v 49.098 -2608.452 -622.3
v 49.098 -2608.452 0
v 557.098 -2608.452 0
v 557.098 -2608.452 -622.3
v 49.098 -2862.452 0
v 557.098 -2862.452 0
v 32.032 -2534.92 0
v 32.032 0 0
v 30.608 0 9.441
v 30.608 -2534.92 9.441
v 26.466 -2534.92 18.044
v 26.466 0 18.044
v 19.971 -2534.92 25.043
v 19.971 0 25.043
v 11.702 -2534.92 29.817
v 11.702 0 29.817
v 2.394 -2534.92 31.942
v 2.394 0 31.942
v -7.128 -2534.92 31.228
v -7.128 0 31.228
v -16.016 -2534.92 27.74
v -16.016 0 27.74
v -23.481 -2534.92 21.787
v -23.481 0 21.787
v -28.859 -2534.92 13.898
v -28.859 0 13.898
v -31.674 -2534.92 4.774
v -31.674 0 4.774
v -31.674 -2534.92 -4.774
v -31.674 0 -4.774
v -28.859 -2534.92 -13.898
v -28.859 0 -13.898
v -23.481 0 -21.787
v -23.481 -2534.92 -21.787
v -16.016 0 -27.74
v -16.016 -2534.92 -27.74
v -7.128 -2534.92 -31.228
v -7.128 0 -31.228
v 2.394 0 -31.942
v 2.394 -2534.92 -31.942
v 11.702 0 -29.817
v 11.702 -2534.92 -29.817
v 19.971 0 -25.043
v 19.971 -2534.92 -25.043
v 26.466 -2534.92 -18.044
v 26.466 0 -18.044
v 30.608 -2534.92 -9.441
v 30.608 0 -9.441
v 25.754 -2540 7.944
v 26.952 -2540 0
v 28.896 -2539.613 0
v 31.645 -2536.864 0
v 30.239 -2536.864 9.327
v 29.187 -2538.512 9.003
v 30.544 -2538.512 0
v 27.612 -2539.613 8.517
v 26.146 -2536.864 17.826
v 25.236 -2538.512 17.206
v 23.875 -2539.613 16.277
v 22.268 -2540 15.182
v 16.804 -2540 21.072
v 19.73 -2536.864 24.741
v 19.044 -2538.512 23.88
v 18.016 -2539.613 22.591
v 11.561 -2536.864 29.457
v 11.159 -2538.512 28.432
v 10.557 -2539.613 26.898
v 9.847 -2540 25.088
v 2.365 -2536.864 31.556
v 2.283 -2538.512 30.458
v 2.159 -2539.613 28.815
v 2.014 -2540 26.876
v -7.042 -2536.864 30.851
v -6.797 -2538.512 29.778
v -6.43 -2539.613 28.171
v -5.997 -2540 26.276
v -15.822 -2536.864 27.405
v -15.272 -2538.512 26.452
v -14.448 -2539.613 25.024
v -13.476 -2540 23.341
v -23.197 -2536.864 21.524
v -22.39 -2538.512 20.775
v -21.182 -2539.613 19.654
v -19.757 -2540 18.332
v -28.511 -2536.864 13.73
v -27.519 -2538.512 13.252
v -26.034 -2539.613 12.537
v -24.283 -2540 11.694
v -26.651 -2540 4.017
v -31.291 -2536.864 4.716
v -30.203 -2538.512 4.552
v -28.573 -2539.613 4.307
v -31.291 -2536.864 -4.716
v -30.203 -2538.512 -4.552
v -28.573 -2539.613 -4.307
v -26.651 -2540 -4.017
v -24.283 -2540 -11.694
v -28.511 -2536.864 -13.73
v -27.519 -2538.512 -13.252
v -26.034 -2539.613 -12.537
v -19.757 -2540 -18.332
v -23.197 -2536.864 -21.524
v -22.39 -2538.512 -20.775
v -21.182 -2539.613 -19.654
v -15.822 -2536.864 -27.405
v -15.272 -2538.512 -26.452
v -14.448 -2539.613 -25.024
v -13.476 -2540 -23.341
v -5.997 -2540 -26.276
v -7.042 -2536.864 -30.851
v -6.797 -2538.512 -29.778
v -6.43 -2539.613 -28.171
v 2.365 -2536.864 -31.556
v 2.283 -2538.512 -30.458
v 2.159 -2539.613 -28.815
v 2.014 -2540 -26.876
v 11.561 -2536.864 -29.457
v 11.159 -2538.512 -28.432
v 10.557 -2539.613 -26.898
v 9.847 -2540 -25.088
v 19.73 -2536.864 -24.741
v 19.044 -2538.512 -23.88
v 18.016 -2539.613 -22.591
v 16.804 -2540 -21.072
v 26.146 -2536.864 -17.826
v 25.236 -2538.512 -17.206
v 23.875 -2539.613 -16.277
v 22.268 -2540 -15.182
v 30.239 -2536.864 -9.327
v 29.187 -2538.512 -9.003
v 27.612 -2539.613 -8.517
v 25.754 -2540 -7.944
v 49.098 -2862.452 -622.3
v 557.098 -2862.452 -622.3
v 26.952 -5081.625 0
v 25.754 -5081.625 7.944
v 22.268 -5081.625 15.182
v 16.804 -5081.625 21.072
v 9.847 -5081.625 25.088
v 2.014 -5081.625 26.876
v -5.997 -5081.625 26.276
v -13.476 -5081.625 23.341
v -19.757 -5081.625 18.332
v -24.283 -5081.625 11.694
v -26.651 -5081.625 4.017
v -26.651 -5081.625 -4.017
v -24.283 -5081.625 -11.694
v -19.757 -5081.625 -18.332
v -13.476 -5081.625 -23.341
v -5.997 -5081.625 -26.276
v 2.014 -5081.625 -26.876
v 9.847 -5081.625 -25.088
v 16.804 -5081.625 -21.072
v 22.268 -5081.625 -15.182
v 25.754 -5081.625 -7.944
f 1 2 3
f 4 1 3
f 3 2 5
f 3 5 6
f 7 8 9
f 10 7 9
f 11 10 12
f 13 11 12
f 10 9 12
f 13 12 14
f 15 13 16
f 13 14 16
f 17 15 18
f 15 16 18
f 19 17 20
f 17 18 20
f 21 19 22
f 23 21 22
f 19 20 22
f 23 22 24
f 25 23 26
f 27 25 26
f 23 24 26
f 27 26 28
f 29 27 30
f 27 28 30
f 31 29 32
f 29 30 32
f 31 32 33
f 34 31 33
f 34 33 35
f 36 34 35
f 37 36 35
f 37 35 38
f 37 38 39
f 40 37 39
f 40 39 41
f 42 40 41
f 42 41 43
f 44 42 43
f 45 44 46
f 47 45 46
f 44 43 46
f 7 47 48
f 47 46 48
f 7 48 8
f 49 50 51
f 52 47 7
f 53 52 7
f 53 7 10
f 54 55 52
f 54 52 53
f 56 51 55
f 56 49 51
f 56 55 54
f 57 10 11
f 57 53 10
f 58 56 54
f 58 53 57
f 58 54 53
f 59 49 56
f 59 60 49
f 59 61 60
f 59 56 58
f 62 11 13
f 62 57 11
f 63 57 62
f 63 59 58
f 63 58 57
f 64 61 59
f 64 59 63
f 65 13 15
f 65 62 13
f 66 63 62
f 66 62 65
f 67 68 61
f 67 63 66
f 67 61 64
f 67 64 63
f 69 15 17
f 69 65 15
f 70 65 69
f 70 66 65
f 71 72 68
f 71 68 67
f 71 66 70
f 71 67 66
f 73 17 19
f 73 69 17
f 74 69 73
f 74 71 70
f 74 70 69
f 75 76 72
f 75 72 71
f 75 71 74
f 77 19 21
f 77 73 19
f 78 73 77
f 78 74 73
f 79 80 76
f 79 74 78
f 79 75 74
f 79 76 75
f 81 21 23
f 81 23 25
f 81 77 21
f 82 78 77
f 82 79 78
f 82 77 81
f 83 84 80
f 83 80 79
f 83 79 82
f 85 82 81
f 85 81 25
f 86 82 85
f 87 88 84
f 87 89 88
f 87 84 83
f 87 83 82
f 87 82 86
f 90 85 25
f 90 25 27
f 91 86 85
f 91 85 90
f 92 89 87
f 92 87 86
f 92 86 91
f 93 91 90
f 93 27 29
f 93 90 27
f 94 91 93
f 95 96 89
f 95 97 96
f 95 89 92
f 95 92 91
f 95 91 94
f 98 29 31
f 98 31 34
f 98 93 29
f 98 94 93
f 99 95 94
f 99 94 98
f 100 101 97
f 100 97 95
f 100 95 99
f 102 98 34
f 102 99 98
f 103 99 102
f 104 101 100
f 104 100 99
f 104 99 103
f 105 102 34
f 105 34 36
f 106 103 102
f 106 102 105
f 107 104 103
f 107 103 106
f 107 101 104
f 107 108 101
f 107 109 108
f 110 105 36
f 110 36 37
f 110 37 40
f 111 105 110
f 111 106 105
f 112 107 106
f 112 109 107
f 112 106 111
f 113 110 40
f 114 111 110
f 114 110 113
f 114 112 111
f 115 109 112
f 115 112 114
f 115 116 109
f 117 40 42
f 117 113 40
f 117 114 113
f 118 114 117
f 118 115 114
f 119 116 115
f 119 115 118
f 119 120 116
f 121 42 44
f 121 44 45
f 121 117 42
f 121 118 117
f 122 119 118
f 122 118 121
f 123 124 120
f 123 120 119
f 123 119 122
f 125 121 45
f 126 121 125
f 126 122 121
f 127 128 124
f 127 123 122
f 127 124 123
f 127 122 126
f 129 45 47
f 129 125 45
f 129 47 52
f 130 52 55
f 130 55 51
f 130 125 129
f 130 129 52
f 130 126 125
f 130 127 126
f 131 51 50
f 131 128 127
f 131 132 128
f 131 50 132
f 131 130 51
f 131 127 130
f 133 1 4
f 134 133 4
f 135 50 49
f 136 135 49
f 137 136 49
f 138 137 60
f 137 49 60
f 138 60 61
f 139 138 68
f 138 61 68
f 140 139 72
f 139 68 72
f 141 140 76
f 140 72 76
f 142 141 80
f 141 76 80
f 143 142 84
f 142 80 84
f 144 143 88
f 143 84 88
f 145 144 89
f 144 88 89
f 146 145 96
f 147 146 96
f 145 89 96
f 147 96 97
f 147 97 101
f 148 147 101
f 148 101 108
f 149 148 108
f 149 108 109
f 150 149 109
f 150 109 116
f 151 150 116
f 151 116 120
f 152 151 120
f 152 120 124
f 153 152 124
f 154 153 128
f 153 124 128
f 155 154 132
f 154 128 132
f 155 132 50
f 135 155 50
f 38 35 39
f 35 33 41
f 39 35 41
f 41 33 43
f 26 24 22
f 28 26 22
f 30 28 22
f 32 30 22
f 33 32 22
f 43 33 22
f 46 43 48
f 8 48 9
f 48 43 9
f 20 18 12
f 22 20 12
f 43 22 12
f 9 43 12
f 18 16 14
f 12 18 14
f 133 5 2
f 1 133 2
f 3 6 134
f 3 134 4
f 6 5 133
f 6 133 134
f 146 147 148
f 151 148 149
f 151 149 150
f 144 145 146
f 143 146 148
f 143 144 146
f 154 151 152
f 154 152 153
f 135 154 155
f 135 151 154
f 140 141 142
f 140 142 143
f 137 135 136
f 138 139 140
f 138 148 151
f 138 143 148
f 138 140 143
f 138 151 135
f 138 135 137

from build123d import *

# Parameters (mm, degrees)
F0_R     = 32.0315478489
F1_DEPTH = 2540
F2_R     = 5.08
F3_DEPTH = 2541.625266
F4_W     = 508
F4_H     = 254
F5_DEPTH = 622.3


# Not quite as in the source:
# - an extrude ends at something that could not be found from the text; its depth is read off the source's solid


with BuildPart() as f1:
    # F0 (on Front) → F1 (new body)
    with BuildSketch(Plane.XZ):
        Circle(F0_R)
    extrude(amount=F1_DEPTH)

    # F2
    f2_edges = [f1.edges().sort_by_distance(p)[0] for p in [
        (-32.031548, -2540, 0),
    ]]
    fillet(f2_edges, radius=F2_R)

    # F3 (add, through all): a face of the model
    f3_faces = [f1.faces().sort_by_distance(p)[0] for p in [
        (0, -2540, 0),
    ]]
    extrude(f3_faces, amount=F3_DEPTH)


with BuildPart() as f5:
    # F4 (on Top) → F5 (new body)
    with BuildSketch(Plane.XY):
        with Locations((303.0977845192, -2735.4523357783)):
            Rectangle(F4_W, F4_H)
    extrude(amount=-F5_DEPTH)


solid = Compound([f1.part, f5.part])
